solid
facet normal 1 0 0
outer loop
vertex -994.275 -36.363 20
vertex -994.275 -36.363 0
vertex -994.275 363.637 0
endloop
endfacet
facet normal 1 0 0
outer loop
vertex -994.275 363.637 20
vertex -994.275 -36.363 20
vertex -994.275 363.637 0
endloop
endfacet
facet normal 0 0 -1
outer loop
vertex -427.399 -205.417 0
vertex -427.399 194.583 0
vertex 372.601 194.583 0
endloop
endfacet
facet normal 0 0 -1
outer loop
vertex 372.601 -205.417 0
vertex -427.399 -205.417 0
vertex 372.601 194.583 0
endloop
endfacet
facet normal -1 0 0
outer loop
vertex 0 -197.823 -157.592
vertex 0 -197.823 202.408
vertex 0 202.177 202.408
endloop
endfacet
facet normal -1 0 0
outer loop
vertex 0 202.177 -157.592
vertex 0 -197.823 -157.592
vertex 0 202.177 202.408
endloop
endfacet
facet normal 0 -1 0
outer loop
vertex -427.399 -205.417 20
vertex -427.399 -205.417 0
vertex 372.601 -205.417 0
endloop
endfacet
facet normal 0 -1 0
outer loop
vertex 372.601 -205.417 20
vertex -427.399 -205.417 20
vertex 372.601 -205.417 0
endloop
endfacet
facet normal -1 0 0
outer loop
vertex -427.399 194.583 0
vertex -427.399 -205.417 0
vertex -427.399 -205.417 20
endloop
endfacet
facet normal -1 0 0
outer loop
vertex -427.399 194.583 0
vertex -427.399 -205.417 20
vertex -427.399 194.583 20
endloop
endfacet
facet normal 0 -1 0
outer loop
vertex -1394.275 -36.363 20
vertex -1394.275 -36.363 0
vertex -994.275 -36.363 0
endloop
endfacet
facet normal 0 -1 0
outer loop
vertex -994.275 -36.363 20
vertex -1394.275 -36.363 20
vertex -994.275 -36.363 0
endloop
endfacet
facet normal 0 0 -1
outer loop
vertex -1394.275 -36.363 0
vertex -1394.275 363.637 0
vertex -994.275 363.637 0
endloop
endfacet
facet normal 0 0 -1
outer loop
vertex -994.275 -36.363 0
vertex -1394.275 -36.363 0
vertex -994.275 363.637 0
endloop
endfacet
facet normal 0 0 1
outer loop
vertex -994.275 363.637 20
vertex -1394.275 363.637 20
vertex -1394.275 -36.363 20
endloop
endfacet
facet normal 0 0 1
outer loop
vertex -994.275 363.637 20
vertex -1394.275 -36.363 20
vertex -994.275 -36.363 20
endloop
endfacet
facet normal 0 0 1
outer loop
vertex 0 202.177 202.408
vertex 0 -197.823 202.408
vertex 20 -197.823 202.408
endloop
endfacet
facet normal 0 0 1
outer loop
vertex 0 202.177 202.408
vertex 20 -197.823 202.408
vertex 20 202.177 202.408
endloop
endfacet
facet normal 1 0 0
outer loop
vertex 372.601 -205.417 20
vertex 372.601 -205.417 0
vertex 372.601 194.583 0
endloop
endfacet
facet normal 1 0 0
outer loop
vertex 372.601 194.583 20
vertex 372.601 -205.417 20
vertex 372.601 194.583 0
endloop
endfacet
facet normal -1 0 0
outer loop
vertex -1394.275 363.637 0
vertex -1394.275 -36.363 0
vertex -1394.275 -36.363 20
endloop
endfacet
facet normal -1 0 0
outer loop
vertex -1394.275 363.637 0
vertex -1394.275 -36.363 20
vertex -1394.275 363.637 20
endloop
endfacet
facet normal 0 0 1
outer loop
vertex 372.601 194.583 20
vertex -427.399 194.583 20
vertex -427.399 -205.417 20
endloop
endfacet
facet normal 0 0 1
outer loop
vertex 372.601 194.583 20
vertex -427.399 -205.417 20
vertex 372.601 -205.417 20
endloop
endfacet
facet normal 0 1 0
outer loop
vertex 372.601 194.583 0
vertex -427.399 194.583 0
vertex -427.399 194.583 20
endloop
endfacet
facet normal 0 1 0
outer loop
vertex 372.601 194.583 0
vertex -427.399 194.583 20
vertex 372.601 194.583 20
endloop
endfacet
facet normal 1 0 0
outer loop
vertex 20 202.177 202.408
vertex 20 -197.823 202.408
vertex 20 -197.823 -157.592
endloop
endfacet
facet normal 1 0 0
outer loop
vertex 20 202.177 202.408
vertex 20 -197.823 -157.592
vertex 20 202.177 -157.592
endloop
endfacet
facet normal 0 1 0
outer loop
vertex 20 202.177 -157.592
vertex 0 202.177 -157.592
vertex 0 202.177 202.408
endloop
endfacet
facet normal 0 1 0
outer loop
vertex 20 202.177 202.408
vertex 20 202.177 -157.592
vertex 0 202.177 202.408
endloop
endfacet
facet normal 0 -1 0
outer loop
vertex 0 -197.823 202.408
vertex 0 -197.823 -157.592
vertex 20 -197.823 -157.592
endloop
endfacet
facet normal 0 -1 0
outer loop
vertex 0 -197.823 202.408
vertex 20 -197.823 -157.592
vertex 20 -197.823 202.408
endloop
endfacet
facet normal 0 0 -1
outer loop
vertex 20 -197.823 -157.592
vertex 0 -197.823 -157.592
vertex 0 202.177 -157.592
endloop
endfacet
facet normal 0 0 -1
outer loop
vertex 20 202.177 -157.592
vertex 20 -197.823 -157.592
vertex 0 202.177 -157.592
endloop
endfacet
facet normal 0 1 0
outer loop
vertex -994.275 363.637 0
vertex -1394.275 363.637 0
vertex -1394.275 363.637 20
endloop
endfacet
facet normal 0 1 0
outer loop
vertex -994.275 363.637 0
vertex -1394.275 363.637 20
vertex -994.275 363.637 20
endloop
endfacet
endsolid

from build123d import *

# Parameters (mm, degrees)
F0_W     = 400
F0_H     = 400
F1_DEPTH = 20
F2_W     = 400
F2_H     = 360
F3_DEPTH = 20
F4_W     = 800
F4_H     = 400
F5_DEPTH = 20


with BuildPart() as f1:
    # F0 (on Top) → F1 (new body)
    with BuildSketch(Plane.XY):
        with Locations((-1194.274637, 163.637382)):
            Rectangle(F0_W, F0_H)
    extrude(amount=F1_DEPTH)


with BuildPart() as f3:
    # F2 (on Right) → F3 (new body)
    with BuildSketch(Plane.YZ):
        with Locations((2.177419, 22.407577)):
            Rectangle(F2_W, F2_H)
    extrude(amount=F3_DEPTH)


with BuildPart() as f5:
    # F4 (on Top) → F5 (new body)
    with BuildSketch(Plane.XY):
        with Locations((-27.399193, -5.416635)):
            Rectangle(F4_W, F4_H)
    extrude(amount=F5_DEPTH)


solid = Compound([f1.part, f3.part, f5.part])
